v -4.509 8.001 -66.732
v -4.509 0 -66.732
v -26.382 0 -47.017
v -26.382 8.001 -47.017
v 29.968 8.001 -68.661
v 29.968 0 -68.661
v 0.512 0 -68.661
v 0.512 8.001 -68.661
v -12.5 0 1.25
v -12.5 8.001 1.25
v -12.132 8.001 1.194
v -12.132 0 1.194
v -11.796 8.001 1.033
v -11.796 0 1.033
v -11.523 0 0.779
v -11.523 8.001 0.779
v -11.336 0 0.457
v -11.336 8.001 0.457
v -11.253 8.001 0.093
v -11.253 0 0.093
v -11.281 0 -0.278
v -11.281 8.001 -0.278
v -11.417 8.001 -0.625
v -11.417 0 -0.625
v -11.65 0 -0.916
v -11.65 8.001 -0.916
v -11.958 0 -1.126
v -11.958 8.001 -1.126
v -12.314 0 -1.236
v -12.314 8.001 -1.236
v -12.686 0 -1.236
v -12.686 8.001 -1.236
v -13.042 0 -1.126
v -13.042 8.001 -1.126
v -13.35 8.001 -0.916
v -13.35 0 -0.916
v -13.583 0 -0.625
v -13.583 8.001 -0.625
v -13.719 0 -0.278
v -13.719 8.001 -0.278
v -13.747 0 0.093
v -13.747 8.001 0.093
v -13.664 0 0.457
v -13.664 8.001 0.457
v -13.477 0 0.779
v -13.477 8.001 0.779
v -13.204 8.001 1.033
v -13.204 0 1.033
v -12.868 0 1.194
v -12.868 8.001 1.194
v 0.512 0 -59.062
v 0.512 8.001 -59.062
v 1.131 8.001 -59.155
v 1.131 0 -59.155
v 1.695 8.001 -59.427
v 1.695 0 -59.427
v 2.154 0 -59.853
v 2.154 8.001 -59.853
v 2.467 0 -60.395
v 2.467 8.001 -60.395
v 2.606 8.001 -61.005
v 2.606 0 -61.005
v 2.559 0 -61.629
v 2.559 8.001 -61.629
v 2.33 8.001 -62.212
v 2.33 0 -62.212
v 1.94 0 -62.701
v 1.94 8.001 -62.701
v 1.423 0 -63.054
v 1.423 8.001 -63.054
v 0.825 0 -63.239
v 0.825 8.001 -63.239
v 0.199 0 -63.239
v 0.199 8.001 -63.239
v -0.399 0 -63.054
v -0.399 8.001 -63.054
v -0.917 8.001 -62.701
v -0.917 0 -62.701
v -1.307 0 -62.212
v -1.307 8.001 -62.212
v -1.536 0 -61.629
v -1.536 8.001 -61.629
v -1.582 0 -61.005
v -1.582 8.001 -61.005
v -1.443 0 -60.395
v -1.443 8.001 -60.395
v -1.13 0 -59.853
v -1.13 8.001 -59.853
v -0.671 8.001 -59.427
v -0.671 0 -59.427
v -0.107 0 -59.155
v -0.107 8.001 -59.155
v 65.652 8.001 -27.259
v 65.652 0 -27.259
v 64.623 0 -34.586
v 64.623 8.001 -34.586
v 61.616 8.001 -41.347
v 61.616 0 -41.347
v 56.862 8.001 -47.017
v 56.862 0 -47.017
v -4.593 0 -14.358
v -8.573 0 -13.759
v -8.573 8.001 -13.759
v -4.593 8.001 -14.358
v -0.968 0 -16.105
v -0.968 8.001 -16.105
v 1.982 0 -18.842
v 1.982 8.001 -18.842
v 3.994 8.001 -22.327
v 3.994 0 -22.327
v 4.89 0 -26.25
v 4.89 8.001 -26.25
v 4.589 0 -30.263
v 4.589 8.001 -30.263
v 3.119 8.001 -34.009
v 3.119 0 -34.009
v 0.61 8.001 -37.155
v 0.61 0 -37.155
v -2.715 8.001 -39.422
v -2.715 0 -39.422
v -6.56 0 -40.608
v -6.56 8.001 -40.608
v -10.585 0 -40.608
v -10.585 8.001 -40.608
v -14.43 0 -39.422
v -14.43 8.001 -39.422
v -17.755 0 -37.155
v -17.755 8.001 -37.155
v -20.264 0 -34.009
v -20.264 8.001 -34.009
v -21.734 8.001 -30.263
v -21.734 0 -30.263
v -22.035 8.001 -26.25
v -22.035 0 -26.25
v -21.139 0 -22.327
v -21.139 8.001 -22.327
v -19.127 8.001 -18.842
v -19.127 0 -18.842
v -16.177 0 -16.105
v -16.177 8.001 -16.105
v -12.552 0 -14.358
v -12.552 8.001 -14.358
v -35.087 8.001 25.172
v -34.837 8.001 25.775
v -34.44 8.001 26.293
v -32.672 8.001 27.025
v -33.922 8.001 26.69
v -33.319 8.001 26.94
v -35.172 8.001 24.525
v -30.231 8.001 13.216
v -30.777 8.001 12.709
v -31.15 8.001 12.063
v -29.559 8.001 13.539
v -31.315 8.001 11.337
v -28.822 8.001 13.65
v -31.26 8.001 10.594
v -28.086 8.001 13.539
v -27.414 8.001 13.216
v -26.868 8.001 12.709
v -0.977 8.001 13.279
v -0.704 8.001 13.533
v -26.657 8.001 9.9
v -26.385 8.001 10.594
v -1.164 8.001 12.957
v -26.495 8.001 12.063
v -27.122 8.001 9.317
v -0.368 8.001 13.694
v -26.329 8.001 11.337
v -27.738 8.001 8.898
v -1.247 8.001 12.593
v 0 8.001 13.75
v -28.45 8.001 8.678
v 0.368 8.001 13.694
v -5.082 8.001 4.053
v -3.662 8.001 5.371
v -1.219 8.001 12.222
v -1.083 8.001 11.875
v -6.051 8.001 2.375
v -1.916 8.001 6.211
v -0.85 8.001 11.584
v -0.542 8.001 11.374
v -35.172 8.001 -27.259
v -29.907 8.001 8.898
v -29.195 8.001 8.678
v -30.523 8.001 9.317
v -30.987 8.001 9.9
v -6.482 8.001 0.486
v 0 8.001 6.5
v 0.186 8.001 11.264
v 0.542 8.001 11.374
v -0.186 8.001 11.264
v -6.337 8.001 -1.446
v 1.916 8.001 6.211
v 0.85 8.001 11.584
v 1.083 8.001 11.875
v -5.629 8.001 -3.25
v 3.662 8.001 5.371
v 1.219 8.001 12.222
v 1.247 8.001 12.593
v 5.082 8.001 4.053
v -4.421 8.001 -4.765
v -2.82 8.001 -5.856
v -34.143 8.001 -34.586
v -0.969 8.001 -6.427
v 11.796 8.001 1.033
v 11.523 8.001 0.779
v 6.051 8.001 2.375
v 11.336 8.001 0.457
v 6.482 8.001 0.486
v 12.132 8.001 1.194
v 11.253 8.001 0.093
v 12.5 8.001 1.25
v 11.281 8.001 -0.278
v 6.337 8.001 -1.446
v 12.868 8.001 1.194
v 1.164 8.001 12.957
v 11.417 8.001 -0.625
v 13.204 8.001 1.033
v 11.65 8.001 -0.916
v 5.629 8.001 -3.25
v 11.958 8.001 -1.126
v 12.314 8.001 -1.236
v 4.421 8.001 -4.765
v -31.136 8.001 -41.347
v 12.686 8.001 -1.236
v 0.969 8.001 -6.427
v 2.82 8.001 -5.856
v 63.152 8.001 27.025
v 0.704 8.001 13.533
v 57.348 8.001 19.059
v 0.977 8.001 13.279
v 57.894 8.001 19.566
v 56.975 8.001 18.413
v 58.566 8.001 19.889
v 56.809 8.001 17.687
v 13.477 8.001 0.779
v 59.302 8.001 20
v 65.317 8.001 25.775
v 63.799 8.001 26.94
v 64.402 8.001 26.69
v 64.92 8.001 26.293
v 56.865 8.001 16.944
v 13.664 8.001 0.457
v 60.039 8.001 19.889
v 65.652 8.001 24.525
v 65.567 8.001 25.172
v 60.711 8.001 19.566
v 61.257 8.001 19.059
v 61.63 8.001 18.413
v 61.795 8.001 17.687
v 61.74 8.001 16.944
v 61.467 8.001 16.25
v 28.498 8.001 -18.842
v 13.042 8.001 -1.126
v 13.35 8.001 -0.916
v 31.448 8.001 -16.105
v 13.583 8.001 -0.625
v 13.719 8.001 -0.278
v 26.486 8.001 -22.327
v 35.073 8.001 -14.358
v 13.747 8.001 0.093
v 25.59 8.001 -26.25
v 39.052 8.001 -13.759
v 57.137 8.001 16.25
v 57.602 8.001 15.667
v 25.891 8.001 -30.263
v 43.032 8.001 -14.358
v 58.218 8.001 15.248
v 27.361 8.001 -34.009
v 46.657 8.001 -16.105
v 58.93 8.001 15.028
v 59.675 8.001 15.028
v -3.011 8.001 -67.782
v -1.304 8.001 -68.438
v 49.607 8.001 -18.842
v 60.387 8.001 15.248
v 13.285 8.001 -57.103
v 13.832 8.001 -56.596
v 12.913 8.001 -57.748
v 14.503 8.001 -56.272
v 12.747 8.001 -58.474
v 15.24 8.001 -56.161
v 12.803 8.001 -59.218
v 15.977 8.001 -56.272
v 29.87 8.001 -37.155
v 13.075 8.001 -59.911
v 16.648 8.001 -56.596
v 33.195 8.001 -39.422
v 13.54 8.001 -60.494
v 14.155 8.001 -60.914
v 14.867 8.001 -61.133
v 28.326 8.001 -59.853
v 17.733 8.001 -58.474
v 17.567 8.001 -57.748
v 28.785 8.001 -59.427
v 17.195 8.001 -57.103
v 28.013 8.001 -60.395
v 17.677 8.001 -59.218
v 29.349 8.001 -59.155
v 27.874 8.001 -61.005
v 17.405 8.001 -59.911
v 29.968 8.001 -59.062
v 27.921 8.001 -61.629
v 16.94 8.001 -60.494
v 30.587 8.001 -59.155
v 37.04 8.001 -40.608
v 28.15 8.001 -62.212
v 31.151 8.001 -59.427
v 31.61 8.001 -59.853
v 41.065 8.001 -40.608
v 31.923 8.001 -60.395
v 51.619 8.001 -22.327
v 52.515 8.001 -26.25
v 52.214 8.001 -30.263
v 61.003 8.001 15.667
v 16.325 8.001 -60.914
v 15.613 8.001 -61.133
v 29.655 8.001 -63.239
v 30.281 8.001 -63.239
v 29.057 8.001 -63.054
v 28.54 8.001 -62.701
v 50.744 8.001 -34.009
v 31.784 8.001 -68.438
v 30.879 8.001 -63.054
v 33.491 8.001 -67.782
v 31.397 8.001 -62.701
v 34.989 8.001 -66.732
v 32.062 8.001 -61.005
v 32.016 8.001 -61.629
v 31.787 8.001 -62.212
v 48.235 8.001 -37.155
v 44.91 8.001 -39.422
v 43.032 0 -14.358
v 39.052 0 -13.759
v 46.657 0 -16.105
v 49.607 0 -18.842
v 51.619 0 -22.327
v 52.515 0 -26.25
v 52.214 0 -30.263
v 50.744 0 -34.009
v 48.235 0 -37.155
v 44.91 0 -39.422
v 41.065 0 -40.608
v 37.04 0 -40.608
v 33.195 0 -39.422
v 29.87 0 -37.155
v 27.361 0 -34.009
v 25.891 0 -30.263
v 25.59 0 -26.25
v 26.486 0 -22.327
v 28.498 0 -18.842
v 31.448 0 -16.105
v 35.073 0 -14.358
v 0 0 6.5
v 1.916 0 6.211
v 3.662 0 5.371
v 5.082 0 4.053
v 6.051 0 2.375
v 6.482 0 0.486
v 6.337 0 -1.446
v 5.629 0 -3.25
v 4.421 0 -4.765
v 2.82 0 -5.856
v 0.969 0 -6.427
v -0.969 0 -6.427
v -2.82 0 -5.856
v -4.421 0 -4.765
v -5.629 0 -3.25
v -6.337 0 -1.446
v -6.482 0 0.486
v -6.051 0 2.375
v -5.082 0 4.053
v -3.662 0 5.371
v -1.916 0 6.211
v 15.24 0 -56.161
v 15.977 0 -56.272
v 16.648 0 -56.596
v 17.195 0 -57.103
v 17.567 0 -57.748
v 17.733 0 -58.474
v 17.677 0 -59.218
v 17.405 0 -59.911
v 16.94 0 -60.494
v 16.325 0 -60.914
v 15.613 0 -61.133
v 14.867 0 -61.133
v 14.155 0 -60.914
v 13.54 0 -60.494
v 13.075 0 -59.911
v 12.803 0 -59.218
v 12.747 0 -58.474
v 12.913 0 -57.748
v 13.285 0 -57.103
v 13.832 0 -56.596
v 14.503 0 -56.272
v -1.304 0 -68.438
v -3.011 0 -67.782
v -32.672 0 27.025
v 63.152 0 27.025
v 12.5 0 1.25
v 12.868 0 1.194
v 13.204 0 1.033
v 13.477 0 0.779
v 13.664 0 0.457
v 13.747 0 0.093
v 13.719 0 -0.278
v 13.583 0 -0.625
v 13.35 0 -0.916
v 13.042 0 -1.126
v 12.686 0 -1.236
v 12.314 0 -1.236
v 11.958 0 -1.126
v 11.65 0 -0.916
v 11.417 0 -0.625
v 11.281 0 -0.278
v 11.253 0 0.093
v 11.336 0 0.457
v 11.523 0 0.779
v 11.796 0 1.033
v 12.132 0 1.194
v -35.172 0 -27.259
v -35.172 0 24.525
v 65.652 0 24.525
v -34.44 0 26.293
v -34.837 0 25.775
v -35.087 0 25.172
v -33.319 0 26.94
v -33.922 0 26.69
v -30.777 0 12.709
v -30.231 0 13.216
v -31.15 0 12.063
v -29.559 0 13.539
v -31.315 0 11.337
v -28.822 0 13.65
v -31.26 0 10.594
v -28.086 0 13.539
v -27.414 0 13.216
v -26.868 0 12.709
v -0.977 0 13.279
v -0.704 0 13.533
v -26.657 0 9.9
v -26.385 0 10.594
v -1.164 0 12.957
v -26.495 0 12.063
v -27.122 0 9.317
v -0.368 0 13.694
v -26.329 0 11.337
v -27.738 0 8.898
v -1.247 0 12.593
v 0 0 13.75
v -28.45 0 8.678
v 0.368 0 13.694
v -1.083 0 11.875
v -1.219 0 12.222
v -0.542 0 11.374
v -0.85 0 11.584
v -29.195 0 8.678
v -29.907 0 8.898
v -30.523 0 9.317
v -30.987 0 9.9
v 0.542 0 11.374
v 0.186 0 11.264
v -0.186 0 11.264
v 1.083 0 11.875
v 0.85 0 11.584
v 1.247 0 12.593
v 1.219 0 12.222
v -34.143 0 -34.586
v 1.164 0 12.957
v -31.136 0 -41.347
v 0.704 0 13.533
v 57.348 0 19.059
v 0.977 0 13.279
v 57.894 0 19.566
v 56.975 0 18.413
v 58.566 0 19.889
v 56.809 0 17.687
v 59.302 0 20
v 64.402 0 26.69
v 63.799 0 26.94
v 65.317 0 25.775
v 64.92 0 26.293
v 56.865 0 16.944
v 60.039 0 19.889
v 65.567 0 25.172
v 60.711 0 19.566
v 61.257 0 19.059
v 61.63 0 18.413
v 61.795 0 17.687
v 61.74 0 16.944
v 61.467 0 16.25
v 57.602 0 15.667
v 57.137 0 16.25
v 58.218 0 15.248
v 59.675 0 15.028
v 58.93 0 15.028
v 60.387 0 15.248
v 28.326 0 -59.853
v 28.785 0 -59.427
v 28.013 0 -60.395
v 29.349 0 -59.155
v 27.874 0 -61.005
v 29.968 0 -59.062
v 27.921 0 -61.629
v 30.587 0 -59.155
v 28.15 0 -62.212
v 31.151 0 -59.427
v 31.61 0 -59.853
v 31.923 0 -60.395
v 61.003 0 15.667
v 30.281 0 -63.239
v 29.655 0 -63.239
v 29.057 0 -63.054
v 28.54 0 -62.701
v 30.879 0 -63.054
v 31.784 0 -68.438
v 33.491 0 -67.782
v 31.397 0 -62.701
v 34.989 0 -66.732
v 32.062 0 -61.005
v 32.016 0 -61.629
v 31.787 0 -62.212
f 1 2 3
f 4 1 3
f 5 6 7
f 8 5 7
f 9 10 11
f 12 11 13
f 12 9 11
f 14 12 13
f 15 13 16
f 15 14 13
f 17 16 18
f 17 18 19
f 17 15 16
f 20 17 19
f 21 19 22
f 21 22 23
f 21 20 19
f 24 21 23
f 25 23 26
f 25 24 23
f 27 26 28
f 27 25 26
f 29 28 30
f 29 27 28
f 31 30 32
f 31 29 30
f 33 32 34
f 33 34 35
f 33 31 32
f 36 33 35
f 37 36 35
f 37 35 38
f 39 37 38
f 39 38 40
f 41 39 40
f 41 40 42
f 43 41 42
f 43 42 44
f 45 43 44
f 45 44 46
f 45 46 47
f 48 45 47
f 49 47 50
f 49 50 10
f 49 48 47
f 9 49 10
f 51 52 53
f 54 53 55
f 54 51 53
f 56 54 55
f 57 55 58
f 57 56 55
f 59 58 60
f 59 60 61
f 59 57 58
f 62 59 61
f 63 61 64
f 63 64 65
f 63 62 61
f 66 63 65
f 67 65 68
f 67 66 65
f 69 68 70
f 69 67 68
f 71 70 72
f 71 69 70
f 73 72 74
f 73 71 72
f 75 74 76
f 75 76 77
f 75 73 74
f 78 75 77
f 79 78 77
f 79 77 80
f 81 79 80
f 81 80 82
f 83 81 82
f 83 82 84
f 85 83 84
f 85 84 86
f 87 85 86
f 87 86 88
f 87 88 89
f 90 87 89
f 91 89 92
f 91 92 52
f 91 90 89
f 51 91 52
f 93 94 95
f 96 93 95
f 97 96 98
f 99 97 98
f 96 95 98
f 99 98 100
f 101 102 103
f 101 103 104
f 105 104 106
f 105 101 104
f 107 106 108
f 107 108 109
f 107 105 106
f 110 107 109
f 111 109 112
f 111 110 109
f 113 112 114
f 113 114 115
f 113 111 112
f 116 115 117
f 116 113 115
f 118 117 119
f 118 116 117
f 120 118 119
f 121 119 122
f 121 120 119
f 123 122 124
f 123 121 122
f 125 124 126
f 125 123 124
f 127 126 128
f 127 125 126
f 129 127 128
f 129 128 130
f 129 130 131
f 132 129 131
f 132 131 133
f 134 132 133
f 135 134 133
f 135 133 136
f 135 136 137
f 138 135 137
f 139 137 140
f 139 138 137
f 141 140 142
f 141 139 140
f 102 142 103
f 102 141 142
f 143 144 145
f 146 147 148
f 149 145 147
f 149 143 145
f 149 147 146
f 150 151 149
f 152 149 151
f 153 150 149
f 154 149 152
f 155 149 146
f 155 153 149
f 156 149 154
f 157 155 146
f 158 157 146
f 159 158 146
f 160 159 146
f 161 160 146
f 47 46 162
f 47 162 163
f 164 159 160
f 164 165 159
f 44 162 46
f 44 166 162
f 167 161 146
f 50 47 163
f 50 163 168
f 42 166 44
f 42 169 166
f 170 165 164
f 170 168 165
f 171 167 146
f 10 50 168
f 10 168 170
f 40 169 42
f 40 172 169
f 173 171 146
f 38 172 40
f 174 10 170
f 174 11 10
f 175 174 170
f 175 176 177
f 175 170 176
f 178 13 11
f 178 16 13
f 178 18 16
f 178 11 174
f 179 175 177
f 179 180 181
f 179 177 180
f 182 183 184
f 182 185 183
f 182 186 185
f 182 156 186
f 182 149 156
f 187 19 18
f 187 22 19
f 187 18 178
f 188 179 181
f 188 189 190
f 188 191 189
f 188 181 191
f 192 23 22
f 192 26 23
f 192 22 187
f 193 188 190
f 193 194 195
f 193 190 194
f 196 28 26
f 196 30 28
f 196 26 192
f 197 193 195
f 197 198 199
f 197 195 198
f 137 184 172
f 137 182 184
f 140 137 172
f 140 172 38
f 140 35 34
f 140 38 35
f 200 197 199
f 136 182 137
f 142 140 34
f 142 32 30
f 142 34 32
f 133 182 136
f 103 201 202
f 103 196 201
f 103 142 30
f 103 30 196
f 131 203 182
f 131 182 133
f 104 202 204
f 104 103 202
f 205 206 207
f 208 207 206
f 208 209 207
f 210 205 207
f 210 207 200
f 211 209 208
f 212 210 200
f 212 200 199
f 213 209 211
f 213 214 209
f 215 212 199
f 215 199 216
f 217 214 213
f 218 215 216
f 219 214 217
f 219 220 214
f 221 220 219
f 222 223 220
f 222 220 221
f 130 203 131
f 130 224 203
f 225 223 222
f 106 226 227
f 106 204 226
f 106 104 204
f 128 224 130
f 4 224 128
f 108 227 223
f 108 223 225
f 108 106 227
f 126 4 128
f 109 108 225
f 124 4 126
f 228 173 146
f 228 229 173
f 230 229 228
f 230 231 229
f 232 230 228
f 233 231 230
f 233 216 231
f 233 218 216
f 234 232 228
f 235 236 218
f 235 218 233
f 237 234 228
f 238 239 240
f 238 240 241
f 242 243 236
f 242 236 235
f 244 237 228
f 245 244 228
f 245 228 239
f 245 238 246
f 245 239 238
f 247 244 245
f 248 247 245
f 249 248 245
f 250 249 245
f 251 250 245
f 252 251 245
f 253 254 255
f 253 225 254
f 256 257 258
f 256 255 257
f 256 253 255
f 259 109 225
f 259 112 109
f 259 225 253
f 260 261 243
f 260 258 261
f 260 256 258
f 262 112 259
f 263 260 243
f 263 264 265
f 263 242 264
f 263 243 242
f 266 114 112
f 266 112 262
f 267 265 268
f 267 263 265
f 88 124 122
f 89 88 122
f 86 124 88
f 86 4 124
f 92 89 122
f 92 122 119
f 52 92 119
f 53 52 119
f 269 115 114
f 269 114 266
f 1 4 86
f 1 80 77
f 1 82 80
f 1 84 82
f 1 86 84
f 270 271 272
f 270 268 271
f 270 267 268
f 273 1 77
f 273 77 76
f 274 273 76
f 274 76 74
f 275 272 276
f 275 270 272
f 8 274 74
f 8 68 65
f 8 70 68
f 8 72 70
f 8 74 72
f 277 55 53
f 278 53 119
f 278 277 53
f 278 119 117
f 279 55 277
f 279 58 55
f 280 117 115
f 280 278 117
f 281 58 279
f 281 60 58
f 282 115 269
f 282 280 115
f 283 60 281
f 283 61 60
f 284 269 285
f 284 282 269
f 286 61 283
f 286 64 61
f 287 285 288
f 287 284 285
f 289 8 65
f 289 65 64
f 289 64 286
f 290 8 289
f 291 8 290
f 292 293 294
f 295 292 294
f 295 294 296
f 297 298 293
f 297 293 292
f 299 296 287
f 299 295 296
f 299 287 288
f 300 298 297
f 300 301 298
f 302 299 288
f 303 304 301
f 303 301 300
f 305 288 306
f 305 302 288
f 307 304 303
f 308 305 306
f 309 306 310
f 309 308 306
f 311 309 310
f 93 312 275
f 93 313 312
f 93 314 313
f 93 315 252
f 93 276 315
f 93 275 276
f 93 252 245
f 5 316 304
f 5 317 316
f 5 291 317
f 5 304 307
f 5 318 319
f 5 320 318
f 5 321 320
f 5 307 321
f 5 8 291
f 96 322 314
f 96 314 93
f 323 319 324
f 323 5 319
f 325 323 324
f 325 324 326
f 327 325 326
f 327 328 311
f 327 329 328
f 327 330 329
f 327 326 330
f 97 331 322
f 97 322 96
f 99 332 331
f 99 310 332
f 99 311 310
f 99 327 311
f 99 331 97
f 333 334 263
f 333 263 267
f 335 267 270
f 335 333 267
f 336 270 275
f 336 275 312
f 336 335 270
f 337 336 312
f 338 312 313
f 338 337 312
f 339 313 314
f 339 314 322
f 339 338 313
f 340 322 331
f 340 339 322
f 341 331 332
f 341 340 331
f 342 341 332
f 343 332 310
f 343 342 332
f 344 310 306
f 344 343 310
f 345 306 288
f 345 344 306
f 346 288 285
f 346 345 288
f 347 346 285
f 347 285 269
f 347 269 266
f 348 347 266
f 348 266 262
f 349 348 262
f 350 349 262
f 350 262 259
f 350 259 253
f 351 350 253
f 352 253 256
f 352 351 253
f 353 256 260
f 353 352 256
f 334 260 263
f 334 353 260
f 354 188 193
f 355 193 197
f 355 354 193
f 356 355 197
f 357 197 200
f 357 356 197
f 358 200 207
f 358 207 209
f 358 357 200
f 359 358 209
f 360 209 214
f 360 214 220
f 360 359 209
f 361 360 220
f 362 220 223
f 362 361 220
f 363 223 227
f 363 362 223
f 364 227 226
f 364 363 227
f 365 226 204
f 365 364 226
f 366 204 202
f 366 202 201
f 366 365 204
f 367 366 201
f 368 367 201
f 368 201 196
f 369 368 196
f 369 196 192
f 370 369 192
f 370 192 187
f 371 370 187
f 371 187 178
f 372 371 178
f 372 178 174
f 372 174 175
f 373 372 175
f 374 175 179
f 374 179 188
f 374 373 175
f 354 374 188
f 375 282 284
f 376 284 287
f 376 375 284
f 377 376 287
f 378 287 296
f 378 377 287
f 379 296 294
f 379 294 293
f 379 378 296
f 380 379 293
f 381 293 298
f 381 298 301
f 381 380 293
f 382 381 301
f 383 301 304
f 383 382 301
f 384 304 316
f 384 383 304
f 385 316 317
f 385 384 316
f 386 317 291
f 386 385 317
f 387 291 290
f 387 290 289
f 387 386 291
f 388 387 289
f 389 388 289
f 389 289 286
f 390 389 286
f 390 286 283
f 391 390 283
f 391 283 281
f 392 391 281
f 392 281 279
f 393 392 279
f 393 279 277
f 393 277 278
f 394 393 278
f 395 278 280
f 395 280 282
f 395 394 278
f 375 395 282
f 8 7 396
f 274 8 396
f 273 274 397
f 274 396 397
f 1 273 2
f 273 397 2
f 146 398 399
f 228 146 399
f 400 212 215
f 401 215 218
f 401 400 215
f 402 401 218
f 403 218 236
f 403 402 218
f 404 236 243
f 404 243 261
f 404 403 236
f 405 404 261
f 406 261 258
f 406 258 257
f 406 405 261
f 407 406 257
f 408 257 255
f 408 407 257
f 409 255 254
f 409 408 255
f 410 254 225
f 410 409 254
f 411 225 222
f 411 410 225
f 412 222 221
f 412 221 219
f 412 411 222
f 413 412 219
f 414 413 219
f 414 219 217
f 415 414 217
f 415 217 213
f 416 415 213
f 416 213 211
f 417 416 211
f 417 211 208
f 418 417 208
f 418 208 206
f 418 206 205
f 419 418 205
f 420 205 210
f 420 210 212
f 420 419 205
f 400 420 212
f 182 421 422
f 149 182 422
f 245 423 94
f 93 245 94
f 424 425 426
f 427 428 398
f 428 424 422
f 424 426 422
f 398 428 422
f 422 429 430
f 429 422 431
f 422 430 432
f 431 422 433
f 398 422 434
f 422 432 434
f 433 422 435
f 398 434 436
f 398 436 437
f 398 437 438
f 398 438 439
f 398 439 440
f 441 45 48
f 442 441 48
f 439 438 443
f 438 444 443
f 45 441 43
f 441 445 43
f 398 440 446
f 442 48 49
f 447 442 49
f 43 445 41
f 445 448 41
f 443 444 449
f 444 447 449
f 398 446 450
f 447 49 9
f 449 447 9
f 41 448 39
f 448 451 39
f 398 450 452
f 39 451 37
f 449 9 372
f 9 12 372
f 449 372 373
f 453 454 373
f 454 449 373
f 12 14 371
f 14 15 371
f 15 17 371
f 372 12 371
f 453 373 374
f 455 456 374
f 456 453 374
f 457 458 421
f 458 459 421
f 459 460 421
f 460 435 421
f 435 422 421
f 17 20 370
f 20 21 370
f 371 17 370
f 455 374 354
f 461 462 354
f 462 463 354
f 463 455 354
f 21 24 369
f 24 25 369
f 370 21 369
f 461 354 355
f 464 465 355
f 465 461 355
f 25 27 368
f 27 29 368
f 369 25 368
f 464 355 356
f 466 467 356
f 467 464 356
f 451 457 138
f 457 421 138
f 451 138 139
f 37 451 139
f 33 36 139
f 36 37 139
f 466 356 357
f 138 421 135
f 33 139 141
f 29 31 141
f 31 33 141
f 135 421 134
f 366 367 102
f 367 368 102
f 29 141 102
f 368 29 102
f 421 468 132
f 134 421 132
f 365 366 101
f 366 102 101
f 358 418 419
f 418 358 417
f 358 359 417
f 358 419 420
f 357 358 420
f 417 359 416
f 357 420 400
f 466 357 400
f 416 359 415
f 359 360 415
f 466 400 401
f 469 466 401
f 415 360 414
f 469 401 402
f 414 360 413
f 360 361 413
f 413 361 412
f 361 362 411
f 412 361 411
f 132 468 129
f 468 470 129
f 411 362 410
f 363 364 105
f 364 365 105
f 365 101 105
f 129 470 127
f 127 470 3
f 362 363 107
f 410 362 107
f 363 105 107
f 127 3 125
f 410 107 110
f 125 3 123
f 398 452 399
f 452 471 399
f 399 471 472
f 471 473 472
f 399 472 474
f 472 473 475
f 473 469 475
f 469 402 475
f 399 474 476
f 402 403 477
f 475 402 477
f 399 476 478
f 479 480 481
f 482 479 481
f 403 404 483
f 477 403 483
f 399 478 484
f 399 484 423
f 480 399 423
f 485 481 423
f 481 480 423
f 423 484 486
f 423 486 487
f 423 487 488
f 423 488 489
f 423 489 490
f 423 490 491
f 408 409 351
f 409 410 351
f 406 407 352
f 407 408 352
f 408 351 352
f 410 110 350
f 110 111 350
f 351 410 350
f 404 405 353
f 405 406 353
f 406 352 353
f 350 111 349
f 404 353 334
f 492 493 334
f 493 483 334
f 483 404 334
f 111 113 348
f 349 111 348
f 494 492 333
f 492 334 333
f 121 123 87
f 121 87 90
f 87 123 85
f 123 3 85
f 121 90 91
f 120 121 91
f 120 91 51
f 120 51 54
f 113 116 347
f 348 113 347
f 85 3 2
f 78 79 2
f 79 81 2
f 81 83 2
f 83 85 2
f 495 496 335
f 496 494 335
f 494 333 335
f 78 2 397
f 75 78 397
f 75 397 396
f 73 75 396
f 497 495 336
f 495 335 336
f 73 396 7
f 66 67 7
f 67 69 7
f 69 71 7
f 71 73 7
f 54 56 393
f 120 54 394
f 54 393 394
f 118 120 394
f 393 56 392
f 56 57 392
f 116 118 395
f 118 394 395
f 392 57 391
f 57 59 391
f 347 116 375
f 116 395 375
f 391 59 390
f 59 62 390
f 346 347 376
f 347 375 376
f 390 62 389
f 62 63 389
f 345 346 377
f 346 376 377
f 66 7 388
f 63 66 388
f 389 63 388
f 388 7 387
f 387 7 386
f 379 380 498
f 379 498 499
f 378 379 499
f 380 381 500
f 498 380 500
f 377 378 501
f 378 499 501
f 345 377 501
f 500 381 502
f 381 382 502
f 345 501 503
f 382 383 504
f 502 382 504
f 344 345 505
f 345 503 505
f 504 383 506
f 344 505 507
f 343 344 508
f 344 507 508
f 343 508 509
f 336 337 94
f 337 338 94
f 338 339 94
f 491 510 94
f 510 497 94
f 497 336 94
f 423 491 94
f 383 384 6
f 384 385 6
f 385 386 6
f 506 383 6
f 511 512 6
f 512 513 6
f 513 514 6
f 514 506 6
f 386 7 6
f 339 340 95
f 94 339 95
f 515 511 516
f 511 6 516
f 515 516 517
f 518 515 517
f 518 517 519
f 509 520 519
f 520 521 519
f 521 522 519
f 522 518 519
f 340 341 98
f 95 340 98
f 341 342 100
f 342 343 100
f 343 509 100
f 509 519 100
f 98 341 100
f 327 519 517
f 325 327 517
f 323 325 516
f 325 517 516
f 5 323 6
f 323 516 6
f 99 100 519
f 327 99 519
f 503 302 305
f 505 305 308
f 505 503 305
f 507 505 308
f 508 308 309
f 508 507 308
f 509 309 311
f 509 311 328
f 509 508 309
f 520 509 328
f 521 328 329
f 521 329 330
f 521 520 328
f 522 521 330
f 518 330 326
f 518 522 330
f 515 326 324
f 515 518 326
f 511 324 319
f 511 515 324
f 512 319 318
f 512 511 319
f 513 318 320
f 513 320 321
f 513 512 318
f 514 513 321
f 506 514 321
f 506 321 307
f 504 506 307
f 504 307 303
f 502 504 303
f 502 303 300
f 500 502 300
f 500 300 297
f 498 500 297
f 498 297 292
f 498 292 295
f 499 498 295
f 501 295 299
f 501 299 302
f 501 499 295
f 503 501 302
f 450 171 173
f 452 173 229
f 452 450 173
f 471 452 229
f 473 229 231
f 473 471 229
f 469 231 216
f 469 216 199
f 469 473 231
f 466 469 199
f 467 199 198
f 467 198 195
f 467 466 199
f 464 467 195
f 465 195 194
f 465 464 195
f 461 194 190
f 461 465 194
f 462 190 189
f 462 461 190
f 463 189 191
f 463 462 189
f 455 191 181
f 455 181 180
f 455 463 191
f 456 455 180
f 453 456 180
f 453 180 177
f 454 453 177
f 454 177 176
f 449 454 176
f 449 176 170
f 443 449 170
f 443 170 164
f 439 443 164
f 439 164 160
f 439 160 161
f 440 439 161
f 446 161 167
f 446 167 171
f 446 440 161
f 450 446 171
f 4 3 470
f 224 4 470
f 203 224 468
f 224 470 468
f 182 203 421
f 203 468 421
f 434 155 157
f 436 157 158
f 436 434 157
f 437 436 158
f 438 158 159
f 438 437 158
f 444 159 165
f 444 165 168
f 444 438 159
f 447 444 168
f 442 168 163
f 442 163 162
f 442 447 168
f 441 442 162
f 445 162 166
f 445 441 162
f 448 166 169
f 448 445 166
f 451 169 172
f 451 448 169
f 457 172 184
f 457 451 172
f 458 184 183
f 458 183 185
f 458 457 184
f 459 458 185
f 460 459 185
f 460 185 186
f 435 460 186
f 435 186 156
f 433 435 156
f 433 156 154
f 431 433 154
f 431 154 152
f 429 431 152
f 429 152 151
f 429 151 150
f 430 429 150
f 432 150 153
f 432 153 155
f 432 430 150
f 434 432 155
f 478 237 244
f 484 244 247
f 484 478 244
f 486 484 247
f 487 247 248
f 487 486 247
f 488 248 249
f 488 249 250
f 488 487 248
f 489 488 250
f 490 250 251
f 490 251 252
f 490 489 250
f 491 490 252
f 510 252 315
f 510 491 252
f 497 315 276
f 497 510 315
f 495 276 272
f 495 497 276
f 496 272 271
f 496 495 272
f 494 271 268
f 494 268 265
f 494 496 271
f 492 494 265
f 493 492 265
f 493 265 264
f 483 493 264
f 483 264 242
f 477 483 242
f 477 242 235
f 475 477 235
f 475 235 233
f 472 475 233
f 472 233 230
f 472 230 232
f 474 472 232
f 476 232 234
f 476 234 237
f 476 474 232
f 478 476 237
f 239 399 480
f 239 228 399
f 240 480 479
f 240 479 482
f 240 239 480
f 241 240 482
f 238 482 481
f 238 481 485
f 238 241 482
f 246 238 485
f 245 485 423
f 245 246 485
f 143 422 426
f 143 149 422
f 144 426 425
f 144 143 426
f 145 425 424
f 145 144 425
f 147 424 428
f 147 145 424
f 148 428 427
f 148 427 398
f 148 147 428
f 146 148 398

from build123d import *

# Parameters (mm, degrees)
SKETCH1_R           = 13.5001
SKETCH1_R_2         = 6.5
SKETCH1_R_3         = 2.1
SKETCH1_R_4         = 2.5
SKETCH1_R_5         = 1.25
BOSS_EXTRUDE1_DEPTH = 8.001
FILLET1_R           = 2.5


with BuildPart() as part:
    # Sketch1 → Boss-Extrude1 (new body)
    with BuildSketch(Plane(origin=(0, 0, 0), x_dir=(1, 0, 0), z_dir=(0, 1, 0))):
        with BuildLine():
            Line((-35.1724, 27.25881268), (-35.1724, -27.025))
            Line((-35.1724, -27.025), (65.6524, -27.025))
            Line((65.6524, -27.025), (65.6524, 27.25881268))
            ThreePointArc((65.6524, 27.25881268), (63.355608012, 38.071472897), (56.861869136, 47.016875617))
            Line((56.861869136, 47.016875617), (34.989131558, 66.732353738))
            ThreePointArc((34.989131558, 66.732353738), (32.657534218, 68.162444257), (29.968168585, 68.661260389))
            Line((29.968168585, 68.661260389), (0.511831415, 68.661260389))
            ThreePointArc((0.511831415, 68.661260389), (-2.177534218, 68.162444257), (-4.509131558, 66.732353738))
            Line((-4.509131558, 66.732353738), (-26.381869136, 47.016875617))
            ThreePointArc((-26.381869136, 47.016875617), (-32.875608012, 38.071472897), (-35.1724, 27.25881268))
        make_face()
        with Locations(Location((-8.5725, 27.25881268, 0), (0, 0, 270))):
            Circle(SKETCH1_R, mode=Mode.SUBTRACT)
        with Locations(Location((39.0525, 27.25881268, 0), (0, 0, 270))):
            Circle(SKETCH1_R, mode=Mode.SUBTRACT)
        with Locations(Location((0, 0, 0), (0, 0, 270))):
            Circle(SKETCH1_R_2, mode=Mode.SUBTRACT)
        with Locations(Location((0.511831415, 61.161999075, 0), (0, 0, 270))):
            Circle(SKETCH1_R_3, mode=Mode.SUBTRACT)
        with Locations(Location((29.968168585, 61.161999075, 0), (0, 0, 270))):
            Circle(SKETCH1_R_3, mode=Mode.SUBTRACT)
        with Locations(Location((-28.8224, -11.15, 0), (0, 0, 270))):
            Circle(SKETCH1_R_4, mode=Mode.SUBTRACT)
        with Locations(Location((59.3024, -17.5, 0), (0, 0, 270))):
            Circle(SKETCH1_R_4, mode=Mode.SUBTRACT)
        with Locations(Location((15.24, 58.661260389, 0), (0, 0, 270))):
            Circle(SKETCH1_R_4, mode=Mode.SUBTRACT)
        with Locations(Location((12.5, 0, 0), (0, 0, 270))):
            Circle(SKETCH1_R_5, mode=Mode.SUBTRACT)
        with Locations(Location((0, -12.5, 0), (0, 0, 270))):
            Circle(SKETCH1_R_5, mode=Mode.SUBTRACT)
        with Locations(Location((-12.5, 0, 0), (0, 0, 270))):
            Circle(SKETCH1_R_5, mode=Mode.SUBTRACT)
    extrude(amount=BOSS_EXTRUDE1_DEPTH)

    # Fillet1
    fillet1_edges = [part.edges().sort_by_distance(p)[0] for p in [
        (65.6524, 4.0005, 27.025),
        (-35.1724, 4.0005, 27.025),
    ]]
    fillet(fillet1_edges, radius=FILLET1_R)


solid = part.part
